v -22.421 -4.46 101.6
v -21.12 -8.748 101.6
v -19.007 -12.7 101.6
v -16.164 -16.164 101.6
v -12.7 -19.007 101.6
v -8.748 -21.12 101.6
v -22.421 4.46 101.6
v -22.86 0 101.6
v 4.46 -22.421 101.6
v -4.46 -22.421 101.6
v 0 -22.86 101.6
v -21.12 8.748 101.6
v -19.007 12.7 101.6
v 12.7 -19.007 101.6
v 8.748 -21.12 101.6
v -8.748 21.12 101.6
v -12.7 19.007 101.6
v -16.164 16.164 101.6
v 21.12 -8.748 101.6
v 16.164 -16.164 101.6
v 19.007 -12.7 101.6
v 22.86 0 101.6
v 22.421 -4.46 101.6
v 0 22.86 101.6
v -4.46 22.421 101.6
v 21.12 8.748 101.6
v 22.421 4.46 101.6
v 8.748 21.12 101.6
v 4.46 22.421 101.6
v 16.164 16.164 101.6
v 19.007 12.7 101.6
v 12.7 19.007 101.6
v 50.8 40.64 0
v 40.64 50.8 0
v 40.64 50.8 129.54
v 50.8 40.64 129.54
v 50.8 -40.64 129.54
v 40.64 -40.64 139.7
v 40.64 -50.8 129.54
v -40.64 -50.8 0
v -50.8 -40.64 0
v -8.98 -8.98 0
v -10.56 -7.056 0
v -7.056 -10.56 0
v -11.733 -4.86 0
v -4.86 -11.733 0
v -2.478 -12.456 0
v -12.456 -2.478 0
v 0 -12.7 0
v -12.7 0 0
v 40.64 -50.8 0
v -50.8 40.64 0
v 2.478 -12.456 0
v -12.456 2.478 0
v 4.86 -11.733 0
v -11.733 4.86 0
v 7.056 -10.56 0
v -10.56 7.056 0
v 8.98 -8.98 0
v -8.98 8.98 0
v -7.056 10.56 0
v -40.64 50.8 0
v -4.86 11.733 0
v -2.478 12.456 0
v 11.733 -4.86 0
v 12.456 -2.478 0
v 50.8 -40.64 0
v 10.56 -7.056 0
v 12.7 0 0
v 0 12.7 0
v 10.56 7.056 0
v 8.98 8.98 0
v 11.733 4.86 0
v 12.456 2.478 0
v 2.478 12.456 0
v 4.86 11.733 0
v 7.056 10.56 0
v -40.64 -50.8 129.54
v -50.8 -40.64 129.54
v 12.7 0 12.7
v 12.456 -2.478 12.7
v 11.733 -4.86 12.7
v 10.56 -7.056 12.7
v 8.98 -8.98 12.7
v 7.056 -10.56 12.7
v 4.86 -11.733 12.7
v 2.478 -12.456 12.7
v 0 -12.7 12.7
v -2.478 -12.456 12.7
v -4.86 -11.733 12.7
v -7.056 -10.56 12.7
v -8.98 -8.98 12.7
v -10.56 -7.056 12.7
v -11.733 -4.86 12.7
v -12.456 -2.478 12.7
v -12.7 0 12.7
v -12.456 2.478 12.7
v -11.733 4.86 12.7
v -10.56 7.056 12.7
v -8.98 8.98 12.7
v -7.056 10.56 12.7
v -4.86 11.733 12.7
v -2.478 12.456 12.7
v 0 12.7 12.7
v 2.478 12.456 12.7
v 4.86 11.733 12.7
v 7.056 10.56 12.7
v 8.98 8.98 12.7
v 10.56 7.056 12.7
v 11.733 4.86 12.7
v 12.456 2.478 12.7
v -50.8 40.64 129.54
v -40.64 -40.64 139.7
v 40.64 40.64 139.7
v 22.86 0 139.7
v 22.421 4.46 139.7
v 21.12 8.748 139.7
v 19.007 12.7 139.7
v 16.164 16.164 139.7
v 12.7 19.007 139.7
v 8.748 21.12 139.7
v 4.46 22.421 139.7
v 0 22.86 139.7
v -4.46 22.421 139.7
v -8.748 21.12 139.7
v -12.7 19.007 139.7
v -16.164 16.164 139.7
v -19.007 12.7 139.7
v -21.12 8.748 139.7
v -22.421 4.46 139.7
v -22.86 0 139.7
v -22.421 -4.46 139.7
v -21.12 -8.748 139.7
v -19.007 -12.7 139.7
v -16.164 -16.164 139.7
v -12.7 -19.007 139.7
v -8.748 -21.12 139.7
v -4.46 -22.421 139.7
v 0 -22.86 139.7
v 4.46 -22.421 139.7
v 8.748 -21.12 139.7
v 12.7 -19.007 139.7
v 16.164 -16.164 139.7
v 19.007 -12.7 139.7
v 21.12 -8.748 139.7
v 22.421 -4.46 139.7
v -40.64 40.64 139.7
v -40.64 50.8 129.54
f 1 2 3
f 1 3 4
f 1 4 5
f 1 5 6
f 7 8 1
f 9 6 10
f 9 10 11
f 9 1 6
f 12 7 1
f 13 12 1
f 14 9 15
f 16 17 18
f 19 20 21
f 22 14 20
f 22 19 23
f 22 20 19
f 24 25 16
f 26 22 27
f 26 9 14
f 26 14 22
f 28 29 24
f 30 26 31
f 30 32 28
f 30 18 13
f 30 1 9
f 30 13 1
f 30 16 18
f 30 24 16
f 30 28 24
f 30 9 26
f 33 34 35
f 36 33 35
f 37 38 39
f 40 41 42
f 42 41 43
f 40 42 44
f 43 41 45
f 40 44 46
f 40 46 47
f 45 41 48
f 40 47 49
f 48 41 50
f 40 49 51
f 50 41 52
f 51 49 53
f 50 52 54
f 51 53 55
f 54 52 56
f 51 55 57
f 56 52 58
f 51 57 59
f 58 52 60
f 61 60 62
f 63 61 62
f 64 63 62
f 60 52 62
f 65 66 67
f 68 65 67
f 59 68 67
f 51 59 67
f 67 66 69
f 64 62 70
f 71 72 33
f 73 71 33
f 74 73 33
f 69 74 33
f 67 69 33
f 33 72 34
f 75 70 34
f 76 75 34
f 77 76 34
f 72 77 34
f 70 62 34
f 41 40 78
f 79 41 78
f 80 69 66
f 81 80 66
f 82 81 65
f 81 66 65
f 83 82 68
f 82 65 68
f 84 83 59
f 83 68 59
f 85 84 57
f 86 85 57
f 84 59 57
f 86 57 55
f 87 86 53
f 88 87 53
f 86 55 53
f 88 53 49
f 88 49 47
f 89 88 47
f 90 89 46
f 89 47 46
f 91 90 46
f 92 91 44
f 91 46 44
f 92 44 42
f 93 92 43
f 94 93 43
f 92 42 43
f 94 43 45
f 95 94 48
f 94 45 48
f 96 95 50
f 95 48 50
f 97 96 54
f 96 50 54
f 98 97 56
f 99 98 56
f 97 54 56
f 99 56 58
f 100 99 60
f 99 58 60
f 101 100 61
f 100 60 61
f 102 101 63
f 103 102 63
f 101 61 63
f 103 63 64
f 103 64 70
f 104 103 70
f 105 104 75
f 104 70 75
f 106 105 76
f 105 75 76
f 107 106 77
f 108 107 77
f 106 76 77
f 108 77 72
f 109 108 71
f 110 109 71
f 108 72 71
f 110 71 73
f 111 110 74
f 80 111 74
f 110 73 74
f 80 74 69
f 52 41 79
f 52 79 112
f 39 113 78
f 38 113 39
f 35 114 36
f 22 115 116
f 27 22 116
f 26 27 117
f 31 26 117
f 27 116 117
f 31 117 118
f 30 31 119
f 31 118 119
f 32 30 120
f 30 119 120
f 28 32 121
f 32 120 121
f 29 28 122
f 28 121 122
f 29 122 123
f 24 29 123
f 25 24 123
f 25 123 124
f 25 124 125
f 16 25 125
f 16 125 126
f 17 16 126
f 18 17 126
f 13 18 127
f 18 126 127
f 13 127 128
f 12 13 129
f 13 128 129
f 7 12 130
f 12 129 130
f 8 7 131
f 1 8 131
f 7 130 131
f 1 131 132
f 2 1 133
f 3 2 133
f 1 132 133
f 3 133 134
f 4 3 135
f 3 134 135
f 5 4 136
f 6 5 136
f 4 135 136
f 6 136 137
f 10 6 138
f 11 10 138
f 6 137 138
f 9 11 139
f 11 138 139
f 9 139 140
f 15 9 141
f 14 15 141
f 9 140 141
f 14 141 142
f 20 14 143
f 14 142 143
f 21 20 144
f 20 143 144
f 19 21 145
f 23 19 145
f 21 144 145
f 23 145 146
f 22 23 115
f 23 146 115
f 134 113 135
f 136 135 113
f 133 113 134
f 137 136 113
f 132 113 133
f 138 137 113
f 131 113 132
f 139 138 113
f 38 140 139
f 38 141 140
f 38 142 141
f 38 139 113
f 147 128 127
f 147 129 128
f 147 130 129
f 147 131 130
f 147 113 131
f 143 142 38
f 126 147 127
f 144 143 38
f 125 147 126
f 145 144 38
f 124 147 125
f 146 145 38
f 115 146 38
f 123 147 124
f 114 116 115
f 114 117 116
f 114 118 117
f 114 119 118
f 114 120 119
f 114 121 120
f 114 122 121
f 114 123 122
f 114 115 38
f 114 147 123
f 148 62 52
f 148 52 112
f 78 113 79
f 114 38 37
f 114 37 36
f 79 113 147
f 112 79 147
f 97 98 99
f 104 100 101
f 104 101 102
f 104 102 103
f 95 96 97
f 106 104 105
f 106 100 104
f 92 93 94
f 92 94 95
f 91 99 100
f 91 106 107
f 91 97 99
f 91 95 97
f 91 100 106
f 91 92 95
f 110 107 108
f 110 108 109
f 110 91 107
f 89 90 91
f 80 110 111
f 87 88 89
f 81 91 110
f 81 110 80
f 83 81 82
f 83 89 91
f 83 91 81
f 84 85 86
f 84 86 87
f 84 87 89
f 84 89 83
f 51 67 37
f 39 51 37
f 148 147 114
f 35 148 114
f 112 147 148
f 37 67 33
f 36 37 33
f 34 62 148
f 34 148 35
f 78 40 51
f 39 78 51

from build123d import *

# Parameters (mm, degrees)
F0_W     = 101.6
F0_H     = 101.6
F1_DEPTH = 139.7
F2_SIZE  = 10.16
F3_R     = 22.86
F4_DEPTH = 38.1
F5_R     = 12.7
F6_DEPTH = 12.7


with BuildPart() as f1:
    # F0 (on Top) → F1 (new body)
    with BuildSketch(Plane.XY):
        Rectangle(F0_W, F0_H)
    extrude(amount=F1_DEPTH)

    # F2
    f2_edges = [f1.edges().sort_by_distance(p)[0] for p in [
        (0, -50.8, 139.7),
        (-50.8, 0, 139.7),
        (50.8, 0, 139.7),
        (0, 50.8, 139.7),
        (-50.8, 50.8, 69.85),
        (50.8, 50.8, 69.85),
        (50.8, -50.8, 69.85),
        (-50.8, -50.8, 69.85),
    ]]
    chamfer(f2_edges, length=F2_SIZE)

    # F3 (on face) → F4 (cut)
    with BuildSketch(Plane.XY.offset(139.7)):
        Circle(F3_R)
    extrude(amount=-F4_DEPTH, mode=Mode.SUBTRACT)

    # F5 (on face) → F6 (cut)
    with BuildSketch(Plane(origin=(0, 0, 0), x_dir=(1, 0, 0), z_dir=(0, 0, -1))):
        Circle(F5_R)
    extrude(amount=-F6_DEPTH, mode=Mode.SUBTRACT)


solid = f1.part
